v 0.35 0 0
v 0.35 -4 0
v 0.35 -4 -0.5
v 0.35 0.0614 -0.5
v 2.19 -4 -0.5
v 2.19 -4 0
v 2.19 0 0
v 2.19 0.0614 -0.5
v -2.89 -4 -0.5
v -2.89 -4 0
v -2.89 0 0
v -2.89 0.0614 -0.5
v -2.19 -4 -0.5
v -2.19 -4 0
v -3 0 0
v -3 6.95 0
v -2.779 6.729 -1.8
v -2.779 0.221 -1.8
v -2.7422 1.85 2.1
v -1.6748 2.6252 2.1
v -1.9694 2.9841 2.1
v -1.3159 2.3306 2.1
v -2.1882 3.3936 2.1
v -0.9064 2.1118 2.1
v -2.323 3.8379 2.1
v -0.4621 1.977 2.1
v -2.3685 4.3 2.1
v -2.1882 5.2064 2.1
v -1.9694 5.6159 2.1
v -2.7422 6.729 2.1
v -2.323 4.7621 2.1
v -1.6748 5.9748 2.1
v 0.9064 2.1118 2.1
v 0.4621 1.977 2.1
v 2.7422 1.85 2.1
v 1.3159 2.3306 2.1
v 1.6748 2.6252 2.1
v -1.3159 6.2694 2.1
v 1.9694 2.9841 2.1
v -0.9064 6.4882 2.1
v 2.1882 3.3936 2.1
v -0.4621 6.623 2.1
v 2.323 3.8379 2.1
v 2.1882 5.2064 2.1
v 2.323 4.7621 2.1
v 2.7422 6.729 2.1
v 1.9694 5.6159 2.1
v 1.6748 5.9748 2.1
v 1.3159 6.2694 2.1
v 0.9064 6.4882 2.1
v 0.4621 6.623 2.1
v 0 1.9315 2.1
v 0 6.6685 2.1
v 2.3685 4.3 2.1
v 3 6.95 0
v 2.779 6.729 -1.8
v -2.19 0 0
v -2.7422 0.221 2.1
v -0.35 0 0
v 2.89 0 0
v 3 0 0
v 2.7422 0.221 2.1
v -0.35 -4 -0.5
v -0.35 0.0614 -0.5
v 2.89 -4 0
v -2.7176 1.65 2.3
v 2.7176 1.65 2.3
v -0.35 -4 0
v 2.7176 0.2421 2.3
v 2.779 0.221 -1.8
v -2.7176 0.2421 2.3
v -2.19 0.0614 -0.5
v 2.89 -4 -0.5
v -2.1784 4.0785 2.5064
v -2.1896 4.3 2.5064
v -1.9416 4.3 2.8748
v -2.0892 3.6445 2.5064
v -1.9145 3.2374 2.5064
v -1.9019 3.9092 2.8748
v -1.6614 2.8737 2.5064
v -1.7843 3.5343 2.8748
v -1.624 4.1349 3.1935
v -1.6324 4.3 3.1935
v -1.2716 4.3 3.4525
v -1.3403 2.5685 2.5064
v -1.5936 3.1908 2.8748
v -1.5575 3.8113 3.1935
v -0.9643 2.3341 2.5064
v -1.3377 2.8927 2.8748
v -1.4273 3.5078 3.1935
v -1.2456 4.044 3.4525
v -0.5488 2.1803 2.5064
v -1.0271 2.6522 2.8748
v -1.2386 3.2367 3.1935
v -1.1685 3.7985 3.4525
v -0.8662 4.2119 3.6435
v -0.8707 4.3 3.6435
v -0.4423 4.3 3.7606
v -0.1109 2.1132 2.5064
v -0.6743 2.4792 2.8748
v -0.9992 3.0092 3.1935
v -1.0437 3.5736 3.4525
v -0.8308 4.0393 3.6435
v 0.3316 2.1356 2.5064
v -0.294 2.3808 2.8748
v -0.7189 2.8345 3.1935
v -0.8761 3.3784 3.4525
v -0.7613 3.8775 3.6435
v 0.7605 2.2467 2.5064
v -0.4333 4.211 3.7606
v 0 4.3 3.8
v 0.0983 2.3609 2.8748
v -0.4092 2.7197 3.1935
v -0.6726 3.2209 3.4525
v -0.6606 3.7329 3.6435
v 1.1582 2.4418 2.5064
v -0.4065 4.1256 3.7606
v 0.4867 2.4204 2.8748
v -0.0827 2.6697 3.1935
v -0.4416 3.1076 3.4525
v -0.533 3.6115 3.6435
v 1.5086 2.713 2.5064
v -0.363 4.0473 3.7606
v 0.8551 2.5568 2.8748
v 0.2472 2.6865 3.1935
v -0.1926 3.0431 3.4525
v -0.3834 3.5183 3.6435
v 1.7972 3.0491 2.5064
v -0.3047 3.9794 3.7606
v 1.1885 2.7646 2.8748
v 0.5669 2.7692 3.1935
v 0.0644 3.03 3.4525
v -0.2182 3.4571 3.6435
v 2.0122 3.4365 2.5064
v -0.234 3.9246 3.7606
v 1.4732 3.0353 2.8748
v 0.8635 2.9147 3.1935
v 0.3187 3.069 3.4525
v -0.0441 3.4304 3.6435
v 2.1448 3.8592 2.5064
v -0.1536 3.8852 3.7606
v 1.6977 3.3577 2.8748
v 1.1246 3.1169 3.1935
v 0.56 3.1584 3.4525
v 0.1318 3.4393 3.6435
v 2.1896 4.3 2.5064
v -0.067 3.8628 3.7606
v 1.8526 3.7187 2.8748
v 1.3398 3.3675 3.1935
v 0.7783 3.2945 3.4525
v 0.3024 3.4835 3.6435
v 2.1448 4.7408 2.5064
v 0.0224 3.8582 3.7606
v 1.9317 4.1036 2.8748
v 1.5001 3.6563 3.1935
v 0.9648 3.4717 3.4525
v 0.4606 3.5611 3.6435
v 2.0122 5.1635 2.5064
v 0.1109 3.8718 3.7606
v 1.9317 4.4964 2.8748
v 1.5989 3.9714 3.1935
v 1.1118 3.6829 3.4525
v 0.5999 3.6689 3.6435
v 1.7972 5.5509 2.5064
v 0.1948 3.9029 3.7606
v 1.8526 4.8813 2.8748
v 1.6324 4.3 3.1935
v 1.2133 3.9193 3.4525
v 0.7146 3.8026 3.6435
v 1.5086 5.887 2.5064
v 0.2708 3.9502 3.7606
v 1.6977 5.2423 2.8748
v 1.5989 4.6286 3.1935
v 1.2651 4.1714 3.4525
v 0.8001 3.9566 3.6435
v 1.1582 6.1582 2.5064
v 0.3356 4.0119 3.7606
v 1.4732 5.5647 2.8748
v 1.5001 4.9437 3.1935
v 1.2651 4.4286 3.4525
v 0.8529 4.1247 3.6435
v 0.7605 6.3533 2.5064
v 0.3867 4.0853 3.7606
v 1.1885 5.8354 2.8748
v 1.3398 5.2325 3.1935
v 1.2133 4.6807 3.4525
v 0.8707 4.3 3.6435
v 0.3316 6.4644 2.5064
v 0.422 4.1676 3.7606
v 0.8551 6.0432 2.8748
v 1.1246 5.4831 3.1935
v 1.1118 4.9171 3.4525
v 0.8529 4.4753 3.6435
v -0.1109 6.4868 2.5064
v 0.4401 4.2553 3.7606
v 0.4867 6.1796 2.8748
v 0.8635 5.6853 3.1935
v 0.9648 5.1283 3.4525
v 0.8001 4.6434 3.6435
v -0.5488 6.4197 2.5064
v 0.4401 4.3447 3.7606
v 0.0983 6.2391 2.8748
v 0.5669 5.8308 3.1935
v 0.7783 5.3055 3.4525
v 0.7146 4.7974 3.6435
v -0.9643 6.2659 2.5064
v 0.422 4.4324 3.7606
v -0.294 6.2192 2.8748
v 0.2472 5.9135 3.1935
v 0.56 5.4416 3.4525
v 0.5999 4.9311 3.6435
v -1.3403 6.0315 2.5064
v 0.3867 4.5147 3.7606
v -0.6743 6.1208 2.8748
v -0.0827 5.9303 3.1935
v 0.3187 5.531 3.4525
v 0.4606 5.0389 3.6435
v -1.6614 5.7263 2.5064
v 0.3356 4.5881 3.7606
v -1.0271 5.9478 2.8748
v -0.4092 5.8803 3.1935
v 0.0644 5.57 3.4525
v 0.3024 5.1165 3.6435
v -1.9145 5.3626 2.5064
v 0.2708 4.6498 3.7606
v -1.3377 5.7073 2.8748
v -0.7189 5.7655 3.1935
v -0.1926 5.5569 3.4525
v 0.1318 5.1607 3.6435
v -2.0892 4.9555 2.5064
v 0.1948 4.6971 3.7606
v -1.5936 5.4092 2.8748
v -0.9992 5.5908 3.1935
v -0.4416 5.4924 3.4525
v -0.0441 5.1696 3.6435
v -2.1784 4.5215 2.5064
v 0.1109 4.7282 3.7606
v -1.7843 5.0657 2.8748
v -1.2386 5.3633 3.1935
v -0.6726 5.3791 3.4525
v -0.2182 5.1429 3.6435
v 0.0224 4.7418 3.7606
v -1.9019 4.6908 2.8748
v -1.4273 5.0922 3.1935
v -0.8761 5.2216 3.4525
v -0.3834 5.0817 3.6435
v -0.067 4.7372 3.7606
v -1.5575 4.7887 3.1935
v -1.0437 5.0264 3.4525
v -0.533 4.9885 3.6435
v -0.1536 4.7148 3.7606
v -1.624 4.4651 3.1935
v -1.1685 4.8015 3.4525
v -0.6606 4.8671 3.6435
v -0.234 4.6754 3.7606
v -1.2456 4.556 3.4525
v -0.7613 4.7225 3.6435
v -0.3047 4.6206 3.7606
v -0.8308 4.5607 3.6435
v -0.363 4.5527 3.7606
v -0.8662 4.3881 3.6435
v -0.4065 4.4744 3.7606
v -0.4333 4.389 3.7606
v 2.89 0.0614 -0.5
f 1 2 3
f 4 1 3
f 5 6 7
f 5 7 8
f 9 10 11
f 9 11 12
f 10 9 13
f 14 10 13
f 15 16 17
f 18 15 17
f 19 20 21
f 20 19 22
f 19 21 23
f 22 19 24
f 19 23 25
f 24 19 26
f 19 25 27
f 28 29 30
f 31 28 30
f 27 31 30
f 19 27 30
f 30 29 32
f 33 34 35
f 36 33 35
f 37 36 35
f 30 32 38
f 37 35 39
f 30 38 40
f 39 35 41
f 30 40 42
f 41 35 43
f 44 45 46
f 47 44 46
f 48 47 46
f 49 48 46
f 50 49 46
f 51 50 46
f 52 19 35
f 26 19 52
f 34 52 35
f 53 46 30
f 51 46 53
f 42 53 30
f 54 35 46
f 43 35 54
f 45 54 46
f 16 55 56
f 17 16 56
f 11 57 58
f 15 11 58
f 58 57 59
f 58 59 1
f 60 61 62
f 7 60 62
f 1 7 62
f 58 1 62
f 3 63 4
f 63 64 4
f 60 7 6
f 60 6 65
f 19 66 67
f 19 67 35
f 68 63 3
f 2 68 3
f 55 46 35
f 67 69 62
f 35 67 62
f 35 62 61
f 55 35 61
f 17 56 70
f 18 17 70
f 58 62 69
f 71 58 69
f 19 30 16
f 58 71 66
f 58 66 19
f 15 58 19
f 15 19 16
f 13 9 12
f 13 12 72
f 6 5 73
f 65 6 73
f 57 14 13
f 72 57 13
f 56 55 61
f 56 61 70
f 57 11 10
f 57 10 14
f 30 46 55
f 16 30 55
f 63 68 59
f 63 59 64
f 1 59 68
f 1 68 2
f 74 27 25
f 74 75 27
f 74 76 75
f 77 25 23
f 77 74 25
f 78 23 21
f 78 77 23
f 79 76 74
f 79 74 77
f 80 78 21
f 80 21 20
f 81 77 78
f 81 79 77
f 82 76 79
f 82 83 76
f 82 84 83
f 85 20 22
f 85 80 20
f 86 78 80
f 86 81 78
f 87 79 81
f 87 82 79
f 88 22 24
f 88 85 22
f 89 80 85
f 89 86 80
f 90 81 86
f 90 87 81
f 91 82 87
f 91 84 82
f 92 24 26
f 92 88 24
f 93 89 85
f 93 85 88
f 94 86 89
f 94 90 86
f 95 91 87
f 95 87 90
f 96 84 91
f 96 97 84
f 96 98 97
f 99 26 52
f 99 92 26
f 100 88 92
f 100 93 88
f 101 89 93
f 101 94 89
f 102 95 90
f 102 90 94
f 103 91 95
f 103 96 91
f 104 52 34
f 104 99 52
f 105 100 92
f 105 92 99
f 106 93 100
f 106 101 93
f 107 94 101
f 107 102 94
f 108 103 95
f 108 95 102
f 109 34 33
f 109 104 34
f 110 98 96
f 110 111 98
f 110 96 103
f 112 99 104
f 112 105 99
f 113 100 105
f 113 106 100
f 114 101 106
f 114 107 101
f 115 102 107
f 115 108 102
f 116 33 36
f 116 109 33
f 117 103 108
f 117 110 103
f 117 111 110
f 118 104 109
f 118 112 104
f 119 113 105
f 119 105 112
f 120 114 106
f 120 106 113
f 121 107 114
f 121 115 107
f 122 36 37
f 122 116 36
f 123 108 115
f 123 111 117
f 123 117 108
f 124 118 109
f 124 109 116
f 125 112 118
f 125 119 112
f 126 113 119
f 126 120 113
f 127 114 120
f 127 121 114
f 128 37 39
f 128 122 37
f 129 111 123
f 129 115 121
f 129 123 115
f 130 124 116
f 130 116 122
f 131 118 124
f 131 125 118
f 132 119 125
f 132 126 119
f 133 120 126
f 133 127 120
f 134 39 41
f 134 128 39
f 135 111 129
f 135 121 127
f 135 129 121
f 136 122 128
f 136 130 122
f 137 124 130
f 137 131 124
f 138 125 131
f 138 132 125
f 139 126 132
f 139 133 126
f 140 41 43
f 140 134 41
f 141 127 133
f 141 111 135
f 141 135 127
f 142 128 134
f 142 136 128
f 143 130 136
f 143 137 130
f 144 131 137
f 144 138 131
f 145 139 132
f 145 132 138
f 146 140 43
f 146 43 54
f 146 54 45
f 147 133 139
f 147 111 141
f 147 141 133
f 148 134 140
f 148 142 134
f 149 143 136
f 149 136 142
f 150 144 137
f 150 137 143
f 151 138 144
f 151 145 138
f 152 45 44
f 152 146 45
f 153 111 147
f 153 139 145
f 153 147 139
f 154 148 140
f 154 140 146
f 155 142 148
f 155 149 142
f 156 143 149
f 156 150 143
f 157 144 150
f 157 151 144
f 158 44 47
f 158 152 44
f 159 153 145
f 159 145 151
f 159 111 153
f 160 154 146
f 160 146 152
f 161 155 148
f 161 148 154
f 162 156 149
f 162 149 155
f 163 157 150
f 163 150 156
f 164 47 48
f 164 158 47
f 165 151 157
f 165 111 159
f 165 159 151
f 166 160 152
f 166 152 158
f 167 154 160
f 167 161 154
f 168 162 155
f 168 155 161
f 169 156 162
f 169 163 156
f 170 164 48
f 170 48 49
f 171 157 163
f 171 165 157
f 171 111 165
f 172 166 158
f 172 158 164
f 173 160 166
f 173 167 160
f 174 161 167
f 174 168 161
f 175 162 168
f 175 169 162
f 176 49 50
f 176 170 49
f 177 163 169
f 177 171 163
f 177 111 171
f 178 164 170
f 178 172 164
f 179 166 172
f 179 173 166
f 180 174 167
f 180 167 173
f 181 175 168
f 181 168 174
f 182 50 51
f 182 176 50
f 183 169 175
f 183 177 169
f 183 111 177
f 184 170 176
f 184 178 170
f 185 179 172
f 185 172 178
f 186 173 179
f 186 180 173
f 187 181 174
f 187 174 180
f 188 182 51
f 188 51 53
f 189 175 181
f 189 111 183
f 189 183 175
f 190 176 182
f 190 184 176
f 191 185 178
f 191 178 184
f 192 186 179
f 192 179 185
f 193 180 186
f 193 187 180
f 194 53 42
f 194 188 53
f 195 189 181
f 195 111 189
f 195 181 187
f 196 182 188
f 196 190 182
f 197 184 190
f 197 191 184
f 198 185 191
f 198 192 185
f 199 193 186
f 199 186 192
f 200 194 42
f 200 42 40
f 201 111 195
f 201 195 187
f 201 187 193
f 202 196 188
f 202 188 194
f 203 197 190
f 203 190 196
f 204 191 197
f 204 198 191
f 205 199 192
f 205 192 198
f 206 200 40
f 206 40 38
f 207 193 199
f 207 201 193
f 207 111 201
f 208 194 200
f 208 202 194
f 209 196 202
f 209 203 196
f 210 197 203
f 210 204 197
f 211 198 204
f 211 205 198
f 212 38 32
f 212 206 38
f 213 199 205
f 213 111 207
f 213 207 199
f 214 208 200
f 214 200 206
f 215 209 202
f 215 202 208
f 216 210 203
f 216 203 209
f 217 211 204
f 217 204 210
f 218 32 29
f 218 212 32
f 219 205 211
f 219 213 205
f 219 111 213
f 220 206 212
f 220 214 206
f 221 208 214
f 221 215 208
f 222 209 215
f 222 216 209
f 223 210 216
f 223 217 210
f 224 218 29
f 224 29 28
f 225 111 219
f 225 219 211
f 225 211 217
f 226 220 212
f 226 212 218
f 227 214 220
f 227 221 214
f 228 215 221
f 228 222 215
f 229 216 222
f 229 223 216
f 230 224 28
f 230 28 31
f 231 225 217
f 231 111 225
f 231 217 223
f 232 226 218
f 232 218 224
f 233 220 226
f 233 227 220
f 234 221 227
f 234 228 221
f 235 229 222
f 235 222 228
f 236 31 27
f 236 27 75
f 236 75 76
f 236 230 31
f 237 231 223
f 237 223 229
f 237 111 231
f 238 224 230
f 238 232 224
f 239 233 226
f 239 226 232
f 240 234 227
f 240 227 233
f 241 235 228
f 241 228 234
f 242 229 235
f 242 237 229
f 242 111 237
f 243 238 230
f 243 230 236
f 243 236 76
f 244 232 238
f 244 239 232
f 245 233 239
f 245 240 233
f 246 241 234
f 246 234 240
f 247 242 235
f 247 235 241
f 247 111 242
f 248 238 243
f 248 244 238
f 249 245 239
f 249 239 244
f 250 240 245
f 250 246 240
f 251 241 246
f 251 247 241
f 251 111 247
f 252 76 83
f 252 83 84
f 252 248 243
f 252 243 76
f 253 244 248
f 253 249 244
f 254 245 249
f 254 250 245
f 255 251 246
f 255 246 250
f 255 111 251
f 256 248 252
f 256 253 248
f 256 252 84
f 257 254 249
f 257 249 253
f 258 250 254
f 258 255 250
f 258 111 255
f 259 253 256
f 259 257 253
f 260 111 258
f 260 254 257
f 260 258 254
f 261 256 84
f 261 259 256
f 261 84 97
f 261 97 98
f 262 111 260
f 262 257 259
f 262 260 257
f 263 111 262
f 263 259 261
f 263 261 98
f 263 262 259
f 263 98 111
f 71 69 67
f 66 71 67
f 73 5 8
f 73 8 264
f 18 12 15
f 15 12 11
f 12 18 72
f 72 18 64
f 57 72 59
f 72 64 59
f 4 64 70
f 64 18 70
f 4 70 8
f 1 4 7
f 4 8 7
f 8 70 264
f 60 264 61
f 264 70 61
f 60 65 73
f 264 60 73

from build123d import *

# Parameters (mm, degrees)
BOSS_EXTRU_1_DEPTH             = 3
ENL_V_START                    = -1
ENL_V_MAT_EXTRU_4_DEPTH        = 8.95
BOSS_EXTRU_2_REACH             = 8.95
ESQUISSE4_W                    = 0.7
ESQUISSE4_H                    = 0.5
BOSS_EXTRU_2_DIRECTION_2_DEPTH = 4


with BuildPart() as part:
    # Esquisse1 → Boss.-Extru.1 (new body, symmetric)
    with BuildSketch(Plane(origin=(0, 0, 0), x_dir=(0, 0, -1), z_dir=(1, 0, 0))):
        Polygon((0, 6.95), (1.8, 6.72898779), (1.8, 0.22101221), (0, 0), (-2.1, 0.22101221), (-2.3, 0.242060991), (-2.3, 1.65), (-2.1, 1.85), (-2.1, 6.72898779), align=None)
    extrude(amount=BOSS_EXTRU_1_DEPTH, both=True)

    # Esquisse2 → Enlèv. mat.-Extru.4 (cut)
    with BuildSketch(Plane(origin=(0, 0, 0), x_dir=(1, 0, 0), z_dir=(0, 1, 0)).offset(ENL_V_START)):
        Polygon((0.22814949, -26.29116777), (-2.71759551, -2.3), (-3, 0), (-2.77898779, 1.8), (0.16675721, 25.79116777), (-48.17588371, 25.734183671), (-48.11449143, -26.348151869), align=None)
    enl_v_mat_extru_4 = extrude(amount=ENL_V_MAT_EXTRU_4_DEPTH, mode=Mode.SUBTRACT)

    # Esquisse3 → Révolution1 (revolve)
    with BuildSketch(Plane(origin=(0, 4.3, 0), x_dir=(-1, 0, 0), z_dir=(0, 1, 0))):
        with BuildLine():
            Line((0, 2.1), (2.368543856, 2.1))
            ThreePointArc((2.368543856, 2.1), (1.457737974, 3.331009601), (0, 3.8))
            Line((0, 3.8), (0, 2.1))
        make_face()
    revolve(axis=Axis((0, 4.3, 2.1), (0, 0, 1)))

    # Symétrie1: Enlèv. mat.-Extru.4 across plane
    add(enl_v_mat_extru_4.mirror(Plane(origin=(0, 0, 0), x_dir=(0, 0, 1), z_dir=(1, 0, 0))), mode=Mode.SUBTRACT)

    # Esquisse4 → Boss.-Extru.2 (add, up to next)
    with BuildSketch(Plane(origin=(0, 0, 0), x_dir=(1, 0, 0), z_dir=(0, 1, 0)), mode=Mode.PRIVATE) as boss_extru_2_sk1:
        with Locations((0, 0.25)):
            Rectangle(ESQUISSE4_W, ESQUISSE4_H)
    boss_extru_2_tool1 = extrude(boss_extru_2_sk1.sketch, amount=BOSS_EXTRU_2_REACH, mode=Mode.PRIVATE) - part.part
    add(boss_extru_2_tool1.solids().sort_by_distance((0, 0, -0.25))[0])
    # Esquisse4 → Boss.-Extru.2 (add, up to next)
    with BuildSketch(Plane(origin=(0, 0, 0), x_dir=(1, 0, 0), z_dir=(0, 1, 0)), mode=Mode.PRIVATE) as boss_extru_2_sk2:
        with Locations((2.54, 0.25)):
            Rectangle(ESQUISSE4_W, ESQUISSE4_H)
    boss_extru_2_tool2 = extrude(boss_extru_2_sk2.sketch, amount=BOSS_EXTRU_2_REACH, mode=Mode.PRIVATE) - part.part
    add(boss_extru_2_tool2.solids().sort_by_distance((2.54, 0, -0.25))[0])
    # Esquisse4 → Boss.-Extru.2 (add, up to next)
    with BuildSketch(Plane(origin=(0, 0, 0), x_dir=(1, 0, 0), z_dir=(0, 1, 0)), mode=Mode.PRIVATE) as boss_extru_2_sk3:
        with Locations((-2.54, 0.25)):
            Rectangle(ESQUISSE4_W, ESQUISSE4_H)
    boss_extru_2_tool3 = extrude(boss_extru_2_sk3.sketch, amount=BOSS_EXTRU_2_REACH, mode=Mode.PRIVATE) - part.part
    add(boss_extru_2_tool3.solids().sort_by_distance((-2.54, 0, -0.25))[0])

    # Esquisse4 → Boss.-Extru.2 direction 2 (add)
    with BuildSketch(Plane(origin=(0, 0, 0), x_dir=(1, 0, 0), z_dir=(0, 1, 0))):
        with Locations((0, 0.25)):
            Rectangle(ESQUISSE4_W, ESQUISSE4_H)
        with Locations((2.54, 0.25)):
            Rectangle(ESQUISSE4_W, ESQUISSE4_H)
        with Locations((-2.54, 0.25)):
            Rectangle(ESQUISSE4_W, ESQUISSE4_H)
    extrude(amount=-BOSS_EXTRU_2_DIRECTION_2_DEPTH)


solid = part.part
